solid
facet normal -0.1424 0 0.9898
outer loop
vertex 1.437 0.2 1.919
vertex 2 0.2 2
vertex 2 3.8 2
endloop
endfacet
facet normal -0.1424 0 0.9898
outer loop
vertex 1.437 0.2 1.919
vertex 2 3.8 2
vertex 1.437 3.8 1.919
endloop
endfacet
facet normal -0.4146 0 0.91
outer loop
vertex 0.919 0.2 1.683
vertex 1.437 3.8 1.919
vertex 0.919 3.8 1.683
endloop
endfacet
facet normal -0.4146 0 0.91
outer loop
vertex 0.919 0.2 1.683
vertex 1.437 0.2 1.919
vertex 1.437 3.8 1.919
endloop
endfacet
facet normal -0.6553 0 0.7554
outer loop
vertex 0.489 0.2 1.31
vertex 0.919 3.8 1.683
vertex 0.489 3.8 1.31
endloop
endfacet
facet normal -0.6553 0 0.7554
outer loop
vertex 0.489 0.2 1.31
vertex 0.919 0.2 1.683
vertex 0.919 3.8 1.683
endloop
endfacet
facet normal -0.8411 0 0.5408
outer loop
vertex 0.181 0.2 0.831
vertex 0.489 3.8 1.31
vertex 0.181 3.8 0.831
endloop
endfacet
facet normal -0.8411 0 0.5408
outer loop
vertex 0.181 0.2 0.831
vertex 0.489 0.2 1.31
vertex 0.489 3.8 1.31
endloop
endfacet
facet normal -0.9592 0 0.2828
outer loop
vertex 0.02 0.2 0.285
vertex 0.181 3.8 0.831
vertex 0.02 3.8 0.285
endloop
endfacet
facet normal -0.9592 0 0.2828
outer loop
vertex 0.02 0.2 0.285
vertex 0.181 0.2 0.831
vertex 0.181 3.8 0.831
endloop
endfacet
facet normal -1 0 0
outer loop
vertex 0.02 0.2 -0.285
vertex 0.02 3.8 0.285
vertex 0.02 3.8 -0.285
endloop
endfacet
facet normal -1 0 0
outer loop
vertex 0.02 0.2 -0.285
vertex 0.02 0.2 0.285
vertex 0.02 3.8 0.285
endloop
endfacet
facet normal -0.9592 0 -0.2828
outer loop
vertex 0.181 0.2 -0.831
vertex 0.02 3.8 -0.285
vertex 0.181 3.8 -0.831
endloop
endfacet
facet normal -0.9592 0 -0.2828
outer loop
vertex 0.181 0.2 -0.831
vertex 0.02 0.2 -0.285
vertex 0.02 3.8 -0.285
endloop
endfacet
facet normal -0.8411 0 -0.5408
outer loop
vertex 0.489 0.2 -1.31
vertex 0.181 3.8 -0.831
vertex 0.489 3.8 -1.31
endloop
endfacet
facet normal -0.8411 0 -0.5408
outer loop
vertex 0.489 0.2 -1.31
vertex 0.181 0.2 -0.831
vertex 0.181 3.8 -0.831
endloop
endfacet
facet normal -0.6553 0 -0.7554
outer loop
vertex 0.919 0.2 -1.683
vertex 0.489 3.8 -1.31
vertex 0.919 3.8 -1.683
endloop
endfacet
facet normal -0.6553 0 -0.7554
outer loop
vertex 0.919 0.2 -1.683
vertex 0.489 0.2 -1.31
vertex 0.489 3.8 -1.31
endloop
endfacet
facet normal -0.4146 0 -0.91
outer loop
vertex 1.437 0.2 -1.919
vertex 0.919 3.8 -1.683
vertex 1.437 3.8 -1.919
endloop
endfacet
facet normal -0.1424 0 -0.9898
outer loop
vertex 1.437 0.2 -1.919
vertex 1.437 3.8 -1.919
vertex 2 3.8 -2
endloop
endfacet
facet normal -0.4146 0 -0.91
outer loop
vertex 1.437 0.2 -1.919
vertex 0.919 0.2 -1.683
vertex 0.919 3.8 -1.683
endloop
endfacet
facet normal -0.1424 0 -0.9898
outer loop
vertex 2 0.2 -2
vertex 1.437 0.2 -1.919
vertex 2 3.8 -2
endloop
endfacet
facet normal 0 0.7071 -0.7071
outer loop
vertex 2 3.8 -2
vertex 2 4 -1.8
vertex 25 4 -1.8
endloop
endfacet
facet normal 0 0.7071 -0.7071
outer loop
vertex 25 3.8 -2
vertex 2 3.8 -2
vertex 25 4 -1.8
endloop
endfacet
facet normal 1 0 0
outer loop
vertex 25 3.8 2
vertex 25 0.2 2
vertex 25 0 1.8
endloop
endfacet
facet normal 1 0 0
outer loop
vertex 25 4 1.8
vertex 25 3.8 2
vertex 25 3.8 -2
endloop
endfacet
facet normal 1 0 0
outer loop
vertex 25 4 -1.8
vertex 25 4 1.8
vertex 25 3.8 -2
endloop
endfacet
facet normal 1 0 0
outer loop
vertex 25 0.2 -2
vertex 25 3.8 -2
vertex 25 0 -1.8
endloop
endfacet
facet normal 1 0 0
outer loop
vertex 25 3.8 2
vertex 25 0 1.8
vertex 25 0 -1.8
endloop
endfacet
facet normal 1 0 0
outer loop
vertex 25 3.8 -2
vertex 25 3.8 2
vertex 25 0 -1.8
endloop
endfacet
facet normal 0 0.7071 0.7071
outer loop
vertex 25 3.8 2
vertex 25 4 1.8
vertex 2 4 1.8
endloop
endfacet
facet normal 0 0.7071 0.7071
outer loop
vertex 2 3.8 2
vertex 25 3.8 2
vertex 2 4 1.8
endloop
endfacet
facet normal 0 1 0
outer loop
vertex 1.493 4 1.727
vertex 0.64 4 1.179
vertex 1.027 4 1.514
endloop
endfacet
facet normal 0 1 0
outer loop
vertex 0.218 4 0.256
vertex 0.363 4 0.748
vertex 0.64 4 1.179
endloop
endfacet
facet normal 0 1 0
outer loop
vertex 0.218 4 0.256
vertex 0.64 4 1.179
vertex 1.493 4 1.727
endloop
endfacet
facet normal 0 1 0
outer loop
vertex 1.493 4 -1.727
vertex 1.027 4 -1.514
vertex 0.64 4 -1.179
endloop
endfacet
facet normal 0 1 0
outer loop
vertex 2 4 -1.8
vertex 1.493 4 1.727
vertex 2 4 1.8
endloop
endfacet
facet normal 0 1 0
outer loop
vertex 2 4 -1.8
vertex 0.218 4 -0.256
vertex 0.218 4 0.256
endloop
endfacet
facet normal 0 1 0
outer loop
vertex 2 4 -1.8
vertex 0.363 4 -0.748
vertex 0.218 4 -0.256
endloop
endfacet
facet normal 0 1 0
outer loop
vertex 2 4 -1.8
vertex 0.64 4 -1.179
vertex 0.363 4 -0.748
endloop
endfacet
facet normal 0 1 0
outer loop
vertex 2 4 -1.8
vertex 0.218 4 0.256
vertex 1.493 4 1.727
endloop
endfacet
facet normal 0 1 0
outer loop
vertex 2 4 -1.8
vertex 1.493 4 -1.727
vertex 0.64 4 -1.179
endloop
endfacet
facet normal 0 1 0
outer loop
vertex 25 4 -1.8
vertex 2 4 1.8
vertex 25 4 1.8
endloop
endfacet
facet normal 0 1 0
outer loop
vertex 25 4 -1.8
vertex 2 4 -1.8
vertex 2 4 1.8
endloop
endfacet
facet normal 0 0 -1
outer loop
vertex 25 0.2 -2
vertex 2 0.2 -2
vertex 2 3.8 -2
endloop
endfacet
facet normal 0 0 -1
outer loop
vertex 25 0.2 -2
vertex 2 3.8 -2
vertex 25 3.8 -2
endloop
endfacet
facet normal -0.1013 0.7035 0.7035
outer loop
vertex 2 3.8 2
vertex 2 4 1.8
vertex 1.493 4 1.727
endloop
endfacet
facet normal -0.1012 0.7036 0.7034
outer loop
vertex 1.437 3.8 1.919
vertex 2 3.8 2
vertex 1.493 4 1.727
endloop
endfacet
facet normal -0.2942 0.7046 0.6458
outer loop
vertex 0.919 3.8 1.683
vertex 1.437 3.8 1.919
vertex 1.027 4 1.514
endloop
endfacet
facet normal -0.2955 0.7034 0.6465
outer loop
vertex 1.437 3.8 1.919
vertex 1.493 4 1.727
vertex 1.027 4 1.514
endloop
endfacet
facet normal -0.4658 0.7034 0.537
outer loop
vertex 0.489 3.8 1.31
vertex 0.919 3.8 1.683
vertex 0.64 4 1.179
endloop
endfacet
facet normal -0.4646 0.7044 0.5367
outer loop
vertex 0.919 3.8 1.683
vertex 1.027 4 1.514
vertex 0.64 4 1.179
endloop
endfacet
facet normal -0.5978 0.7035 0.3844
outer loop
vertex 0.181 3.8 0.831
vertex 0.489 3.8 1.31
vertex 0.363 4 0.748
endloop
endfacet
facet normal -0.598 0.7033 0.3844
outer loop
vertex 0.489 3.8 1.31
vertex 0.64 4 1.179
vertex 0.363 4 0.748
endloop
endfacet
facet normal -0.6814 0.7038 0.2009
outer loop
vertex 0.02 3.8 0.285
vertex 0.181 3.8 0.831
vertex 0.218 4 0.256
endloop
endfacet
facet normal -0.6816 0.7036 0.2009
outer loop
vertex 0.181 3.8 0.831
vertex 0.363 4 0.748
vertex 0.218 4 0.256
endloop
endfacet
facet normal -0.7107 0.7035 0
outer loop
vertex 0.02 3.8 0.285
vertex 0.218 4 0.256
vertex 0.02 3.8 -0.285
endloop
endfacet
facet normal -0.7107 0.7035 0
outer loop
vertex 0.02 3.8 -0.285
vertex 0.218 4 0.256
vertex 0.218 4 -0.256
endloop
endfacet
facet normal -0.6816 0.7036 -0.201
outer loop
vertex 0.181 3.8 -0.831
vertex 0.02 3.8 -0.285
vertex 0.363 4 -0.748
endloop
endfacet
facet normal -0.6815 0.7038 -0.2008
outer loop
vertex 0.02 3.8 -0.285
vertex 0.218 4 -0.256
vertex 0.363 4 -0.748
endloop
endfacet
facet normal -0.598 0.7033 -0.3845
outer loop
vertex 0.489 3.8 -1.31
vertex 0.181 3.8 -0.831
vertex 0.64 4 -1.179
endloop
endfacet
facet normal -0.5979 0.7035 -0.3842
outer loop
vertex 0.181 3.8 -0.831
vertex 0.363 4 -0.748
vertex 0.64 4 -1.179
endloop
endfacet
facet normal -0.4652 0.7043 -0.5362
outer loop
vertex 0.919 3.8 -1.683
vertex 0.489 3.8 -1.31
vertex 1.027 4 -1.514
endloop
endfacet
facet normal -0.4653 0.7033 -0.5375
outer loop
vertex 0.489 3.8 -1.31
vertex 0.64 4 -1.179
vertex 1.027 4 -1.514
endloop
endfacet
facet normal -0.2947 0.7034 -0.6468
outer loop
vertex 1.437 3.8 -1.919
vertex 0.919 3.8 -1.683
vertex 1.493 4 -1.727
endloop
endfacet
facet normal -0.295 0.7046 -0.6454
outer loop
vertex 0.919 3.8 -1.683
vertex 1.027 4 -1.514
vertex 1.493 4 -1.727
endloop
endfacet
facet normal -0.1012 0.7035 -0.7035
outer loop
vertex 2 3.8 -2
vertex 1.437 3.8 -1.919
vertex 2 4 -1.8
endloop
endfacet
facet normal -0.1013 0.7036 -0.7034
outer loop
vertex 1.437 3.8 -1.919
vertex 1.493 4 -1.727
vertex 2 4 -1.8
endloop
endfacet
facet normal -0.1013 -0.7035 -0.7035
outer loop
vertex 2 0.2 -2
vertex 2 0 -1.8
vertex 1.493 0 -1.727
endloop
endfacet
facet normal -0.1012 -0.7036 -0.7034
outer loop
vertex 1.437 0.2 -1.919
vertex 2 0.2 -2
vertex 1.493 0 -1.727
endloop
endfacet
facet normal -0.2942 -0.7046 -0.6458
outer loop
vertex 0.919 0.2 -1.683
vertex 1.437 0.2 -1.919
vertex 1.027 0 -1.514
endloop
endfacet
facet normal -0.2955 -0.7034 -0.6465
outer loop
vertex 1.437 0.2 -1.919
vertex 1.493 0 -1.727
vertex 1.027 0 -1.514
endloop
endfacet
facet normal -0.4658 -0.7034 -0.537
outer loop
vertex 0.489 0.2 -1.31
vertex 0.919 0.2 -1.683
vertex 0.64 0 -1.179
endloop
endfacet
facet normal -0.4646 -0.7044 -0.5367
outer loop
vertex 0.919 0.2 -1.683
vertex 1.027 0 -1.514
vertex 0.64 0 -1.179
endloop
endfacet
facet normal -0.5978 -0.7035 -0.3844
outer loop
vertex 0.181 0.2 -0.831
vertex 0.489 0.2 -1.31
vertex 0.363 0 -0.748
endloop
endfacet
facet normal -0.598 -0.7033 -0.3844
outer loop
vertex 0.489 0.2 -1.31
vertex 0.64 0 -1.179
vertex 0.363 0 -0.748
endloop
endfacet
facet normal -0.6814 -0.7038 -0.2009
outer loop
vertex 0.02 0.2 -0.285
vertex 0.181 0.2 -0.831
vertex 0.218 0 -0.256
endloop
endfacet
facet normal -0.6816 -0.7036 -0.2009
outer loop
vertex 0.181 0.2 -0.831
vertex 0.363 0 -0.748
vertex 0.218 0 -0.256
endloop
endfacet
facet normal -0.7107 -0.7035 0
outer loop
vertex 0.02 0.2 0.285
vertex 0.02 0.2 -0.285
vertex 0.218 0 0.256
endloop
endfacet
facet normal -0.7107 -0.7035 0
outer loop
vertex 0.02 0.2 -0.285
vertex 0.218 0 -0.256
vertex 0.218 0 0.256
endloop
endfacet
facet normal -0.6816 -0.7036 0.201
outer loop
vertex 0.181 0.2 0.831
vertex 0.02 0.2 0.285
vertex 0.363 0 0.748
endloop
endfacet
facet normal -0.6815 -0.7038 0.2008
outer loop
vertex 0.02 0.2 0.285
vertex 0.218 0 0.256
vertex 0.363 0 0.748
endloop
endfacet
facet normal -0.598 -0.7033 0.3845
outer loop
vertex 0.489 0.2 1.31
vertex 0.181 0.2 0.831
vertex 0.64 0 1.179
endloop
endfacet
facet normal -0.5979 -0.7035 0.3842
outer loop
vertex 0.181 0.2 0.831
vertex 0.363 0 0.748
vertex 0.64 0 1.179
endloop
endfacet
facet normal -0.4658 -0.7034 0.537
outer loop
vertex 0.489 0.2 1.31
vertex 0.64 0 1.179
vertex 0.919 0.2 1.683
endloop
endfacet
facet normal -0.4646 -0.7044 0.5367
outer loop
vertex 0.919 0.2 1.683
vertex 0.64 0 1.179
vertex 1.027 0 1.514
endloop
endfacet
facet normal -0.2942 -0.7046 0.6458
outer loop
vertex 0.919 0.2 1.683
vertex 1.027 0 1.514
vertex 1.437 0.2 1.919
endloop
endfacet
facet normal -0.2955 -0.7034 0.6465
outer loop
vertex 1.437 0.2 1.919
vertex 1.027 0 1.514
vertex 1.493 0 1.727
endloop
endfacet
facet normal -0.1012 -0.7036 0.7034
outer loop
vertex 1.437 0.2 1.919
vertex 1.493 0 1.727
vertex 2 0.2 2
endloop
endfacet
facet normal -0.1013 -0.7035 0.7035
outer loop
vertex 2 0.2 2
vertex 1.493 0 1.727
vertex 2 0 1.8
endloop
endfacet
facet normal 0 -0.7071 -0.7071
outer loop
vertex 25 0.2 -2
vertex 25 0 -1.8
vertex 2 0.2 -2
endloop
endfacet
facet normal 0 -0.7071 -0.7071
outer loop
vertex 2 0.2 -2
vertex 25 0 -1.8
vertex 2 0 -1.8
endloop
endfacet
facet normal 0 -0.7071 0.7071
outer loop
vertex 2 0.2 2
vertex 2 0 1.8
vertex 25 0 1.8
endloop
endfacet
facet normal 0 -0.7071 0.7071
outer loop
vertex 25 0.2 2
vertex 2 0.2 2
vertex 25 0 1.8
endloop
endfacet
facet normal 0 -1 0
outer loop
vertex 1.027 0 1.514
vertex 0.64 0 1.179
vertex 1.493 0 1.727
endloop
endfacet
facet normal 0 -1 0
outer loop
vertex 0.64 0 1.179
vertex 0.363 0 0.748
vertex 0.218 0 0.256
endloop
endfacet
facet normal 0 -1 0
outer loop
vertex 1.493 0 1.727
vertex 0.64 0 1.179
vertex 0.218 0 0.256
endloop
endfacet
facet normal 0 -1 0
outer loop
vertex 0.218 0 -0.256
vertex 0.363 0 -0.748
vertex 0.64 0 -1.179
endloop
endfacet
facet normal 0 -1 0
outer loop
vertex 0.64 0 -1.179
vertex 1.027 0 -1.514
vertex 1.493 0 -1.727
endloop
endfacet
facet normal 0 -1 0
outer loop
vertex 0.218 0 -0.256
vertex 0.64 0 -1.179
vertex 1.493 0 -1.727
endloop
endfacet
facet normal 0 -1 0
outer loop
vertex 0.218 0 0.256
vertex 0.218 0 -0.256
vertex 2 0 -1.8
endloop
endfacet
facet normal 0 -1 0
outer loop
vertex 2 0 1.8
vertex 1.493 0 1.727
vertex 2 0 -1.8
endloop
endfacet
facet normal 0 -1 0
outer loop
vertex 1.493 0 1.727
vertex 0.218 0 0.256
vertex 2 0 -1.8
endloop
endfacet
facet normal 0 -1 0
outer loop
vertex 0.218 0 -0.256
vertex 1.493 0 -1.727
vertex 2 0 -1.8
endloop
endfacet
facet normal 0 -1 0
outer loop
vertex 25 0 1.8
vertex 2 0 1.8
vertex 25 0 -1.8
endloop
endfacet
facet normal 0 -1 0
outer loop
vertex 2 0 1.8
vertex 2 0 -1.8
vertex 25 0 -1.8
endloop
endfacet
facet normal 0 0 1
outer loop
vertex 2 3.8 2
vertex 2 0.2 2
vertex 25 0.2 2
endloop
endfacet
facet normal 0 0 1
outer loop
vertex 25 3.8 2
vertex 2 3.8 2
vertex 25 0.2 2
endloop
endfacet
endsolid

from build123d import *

# Parameters (mm, degrees)
SKETCH1_W           = 25
SKETCH1_H           = 4
BOSS_EXTRUDE1_DEPTH = 4
FILLET1_RADIUS      = 2
FILLET1_LENGTH      = 4
CHAMFER1_SIZE       = 0.2


with BuildPart() as part:
    # Sketch1 → Boss-Extrude1 (new body)
    with BuildSketch(Plane(origin=(0, 0, 0), x_dir=(1, 0, 0), z_dir=(0, 1, 0))):
        with Locations((12.5, 0)):
            Rectangle(SKETCH1_W, SKETCH1_H)
    extrude(amount=BOSS_EXTRUDE1_DEPTH)

    # Fillet1: full round fillet: the end face becomes a half cylinder, R = half its width
    fillet1_face = Plane((0, 2, 0), x_dir=(0, -1, 0), z_dir=(-1, 0, 0))  # on the end face: x along it, z out of the body
    fillet1_slab = fillet1_face.offset(-FILLET1_RADIUS / 2) * Box(FILLET1_LENGTH, 2 * FILLET1_RADIUS, FILLET1_RADIUS, mode=Mode.PRIVATE)  # the body's end, R deep
    fillet1_round = Plane((2, 2, 0), x_dir=(-1, 0, 0), z_dir=(0, -1, 0)) * Cylinder(FILLET1_RADIUS, FILLET1_LENGTH, mode=Mode.PRIVATE)  # its axis R under the face
    add(fillet1_slab - fillet1_round, mode=Mode.SUBTRACT)

    # Chamfer1
    chamfer1_edges = [part.edges().sort_by_distance(p)[0] for p in [
        (13.5, 4, -2),
        (13.5, 0, 2),
        (13.5, 4, 2),
        (0, 0, 0),
        (0, 4, 0),
        (13.5, 0, -2),
    ]]
    chamfer(chamfer1_edges, length=CHAMFER1_SIZE)


solid = part.part
